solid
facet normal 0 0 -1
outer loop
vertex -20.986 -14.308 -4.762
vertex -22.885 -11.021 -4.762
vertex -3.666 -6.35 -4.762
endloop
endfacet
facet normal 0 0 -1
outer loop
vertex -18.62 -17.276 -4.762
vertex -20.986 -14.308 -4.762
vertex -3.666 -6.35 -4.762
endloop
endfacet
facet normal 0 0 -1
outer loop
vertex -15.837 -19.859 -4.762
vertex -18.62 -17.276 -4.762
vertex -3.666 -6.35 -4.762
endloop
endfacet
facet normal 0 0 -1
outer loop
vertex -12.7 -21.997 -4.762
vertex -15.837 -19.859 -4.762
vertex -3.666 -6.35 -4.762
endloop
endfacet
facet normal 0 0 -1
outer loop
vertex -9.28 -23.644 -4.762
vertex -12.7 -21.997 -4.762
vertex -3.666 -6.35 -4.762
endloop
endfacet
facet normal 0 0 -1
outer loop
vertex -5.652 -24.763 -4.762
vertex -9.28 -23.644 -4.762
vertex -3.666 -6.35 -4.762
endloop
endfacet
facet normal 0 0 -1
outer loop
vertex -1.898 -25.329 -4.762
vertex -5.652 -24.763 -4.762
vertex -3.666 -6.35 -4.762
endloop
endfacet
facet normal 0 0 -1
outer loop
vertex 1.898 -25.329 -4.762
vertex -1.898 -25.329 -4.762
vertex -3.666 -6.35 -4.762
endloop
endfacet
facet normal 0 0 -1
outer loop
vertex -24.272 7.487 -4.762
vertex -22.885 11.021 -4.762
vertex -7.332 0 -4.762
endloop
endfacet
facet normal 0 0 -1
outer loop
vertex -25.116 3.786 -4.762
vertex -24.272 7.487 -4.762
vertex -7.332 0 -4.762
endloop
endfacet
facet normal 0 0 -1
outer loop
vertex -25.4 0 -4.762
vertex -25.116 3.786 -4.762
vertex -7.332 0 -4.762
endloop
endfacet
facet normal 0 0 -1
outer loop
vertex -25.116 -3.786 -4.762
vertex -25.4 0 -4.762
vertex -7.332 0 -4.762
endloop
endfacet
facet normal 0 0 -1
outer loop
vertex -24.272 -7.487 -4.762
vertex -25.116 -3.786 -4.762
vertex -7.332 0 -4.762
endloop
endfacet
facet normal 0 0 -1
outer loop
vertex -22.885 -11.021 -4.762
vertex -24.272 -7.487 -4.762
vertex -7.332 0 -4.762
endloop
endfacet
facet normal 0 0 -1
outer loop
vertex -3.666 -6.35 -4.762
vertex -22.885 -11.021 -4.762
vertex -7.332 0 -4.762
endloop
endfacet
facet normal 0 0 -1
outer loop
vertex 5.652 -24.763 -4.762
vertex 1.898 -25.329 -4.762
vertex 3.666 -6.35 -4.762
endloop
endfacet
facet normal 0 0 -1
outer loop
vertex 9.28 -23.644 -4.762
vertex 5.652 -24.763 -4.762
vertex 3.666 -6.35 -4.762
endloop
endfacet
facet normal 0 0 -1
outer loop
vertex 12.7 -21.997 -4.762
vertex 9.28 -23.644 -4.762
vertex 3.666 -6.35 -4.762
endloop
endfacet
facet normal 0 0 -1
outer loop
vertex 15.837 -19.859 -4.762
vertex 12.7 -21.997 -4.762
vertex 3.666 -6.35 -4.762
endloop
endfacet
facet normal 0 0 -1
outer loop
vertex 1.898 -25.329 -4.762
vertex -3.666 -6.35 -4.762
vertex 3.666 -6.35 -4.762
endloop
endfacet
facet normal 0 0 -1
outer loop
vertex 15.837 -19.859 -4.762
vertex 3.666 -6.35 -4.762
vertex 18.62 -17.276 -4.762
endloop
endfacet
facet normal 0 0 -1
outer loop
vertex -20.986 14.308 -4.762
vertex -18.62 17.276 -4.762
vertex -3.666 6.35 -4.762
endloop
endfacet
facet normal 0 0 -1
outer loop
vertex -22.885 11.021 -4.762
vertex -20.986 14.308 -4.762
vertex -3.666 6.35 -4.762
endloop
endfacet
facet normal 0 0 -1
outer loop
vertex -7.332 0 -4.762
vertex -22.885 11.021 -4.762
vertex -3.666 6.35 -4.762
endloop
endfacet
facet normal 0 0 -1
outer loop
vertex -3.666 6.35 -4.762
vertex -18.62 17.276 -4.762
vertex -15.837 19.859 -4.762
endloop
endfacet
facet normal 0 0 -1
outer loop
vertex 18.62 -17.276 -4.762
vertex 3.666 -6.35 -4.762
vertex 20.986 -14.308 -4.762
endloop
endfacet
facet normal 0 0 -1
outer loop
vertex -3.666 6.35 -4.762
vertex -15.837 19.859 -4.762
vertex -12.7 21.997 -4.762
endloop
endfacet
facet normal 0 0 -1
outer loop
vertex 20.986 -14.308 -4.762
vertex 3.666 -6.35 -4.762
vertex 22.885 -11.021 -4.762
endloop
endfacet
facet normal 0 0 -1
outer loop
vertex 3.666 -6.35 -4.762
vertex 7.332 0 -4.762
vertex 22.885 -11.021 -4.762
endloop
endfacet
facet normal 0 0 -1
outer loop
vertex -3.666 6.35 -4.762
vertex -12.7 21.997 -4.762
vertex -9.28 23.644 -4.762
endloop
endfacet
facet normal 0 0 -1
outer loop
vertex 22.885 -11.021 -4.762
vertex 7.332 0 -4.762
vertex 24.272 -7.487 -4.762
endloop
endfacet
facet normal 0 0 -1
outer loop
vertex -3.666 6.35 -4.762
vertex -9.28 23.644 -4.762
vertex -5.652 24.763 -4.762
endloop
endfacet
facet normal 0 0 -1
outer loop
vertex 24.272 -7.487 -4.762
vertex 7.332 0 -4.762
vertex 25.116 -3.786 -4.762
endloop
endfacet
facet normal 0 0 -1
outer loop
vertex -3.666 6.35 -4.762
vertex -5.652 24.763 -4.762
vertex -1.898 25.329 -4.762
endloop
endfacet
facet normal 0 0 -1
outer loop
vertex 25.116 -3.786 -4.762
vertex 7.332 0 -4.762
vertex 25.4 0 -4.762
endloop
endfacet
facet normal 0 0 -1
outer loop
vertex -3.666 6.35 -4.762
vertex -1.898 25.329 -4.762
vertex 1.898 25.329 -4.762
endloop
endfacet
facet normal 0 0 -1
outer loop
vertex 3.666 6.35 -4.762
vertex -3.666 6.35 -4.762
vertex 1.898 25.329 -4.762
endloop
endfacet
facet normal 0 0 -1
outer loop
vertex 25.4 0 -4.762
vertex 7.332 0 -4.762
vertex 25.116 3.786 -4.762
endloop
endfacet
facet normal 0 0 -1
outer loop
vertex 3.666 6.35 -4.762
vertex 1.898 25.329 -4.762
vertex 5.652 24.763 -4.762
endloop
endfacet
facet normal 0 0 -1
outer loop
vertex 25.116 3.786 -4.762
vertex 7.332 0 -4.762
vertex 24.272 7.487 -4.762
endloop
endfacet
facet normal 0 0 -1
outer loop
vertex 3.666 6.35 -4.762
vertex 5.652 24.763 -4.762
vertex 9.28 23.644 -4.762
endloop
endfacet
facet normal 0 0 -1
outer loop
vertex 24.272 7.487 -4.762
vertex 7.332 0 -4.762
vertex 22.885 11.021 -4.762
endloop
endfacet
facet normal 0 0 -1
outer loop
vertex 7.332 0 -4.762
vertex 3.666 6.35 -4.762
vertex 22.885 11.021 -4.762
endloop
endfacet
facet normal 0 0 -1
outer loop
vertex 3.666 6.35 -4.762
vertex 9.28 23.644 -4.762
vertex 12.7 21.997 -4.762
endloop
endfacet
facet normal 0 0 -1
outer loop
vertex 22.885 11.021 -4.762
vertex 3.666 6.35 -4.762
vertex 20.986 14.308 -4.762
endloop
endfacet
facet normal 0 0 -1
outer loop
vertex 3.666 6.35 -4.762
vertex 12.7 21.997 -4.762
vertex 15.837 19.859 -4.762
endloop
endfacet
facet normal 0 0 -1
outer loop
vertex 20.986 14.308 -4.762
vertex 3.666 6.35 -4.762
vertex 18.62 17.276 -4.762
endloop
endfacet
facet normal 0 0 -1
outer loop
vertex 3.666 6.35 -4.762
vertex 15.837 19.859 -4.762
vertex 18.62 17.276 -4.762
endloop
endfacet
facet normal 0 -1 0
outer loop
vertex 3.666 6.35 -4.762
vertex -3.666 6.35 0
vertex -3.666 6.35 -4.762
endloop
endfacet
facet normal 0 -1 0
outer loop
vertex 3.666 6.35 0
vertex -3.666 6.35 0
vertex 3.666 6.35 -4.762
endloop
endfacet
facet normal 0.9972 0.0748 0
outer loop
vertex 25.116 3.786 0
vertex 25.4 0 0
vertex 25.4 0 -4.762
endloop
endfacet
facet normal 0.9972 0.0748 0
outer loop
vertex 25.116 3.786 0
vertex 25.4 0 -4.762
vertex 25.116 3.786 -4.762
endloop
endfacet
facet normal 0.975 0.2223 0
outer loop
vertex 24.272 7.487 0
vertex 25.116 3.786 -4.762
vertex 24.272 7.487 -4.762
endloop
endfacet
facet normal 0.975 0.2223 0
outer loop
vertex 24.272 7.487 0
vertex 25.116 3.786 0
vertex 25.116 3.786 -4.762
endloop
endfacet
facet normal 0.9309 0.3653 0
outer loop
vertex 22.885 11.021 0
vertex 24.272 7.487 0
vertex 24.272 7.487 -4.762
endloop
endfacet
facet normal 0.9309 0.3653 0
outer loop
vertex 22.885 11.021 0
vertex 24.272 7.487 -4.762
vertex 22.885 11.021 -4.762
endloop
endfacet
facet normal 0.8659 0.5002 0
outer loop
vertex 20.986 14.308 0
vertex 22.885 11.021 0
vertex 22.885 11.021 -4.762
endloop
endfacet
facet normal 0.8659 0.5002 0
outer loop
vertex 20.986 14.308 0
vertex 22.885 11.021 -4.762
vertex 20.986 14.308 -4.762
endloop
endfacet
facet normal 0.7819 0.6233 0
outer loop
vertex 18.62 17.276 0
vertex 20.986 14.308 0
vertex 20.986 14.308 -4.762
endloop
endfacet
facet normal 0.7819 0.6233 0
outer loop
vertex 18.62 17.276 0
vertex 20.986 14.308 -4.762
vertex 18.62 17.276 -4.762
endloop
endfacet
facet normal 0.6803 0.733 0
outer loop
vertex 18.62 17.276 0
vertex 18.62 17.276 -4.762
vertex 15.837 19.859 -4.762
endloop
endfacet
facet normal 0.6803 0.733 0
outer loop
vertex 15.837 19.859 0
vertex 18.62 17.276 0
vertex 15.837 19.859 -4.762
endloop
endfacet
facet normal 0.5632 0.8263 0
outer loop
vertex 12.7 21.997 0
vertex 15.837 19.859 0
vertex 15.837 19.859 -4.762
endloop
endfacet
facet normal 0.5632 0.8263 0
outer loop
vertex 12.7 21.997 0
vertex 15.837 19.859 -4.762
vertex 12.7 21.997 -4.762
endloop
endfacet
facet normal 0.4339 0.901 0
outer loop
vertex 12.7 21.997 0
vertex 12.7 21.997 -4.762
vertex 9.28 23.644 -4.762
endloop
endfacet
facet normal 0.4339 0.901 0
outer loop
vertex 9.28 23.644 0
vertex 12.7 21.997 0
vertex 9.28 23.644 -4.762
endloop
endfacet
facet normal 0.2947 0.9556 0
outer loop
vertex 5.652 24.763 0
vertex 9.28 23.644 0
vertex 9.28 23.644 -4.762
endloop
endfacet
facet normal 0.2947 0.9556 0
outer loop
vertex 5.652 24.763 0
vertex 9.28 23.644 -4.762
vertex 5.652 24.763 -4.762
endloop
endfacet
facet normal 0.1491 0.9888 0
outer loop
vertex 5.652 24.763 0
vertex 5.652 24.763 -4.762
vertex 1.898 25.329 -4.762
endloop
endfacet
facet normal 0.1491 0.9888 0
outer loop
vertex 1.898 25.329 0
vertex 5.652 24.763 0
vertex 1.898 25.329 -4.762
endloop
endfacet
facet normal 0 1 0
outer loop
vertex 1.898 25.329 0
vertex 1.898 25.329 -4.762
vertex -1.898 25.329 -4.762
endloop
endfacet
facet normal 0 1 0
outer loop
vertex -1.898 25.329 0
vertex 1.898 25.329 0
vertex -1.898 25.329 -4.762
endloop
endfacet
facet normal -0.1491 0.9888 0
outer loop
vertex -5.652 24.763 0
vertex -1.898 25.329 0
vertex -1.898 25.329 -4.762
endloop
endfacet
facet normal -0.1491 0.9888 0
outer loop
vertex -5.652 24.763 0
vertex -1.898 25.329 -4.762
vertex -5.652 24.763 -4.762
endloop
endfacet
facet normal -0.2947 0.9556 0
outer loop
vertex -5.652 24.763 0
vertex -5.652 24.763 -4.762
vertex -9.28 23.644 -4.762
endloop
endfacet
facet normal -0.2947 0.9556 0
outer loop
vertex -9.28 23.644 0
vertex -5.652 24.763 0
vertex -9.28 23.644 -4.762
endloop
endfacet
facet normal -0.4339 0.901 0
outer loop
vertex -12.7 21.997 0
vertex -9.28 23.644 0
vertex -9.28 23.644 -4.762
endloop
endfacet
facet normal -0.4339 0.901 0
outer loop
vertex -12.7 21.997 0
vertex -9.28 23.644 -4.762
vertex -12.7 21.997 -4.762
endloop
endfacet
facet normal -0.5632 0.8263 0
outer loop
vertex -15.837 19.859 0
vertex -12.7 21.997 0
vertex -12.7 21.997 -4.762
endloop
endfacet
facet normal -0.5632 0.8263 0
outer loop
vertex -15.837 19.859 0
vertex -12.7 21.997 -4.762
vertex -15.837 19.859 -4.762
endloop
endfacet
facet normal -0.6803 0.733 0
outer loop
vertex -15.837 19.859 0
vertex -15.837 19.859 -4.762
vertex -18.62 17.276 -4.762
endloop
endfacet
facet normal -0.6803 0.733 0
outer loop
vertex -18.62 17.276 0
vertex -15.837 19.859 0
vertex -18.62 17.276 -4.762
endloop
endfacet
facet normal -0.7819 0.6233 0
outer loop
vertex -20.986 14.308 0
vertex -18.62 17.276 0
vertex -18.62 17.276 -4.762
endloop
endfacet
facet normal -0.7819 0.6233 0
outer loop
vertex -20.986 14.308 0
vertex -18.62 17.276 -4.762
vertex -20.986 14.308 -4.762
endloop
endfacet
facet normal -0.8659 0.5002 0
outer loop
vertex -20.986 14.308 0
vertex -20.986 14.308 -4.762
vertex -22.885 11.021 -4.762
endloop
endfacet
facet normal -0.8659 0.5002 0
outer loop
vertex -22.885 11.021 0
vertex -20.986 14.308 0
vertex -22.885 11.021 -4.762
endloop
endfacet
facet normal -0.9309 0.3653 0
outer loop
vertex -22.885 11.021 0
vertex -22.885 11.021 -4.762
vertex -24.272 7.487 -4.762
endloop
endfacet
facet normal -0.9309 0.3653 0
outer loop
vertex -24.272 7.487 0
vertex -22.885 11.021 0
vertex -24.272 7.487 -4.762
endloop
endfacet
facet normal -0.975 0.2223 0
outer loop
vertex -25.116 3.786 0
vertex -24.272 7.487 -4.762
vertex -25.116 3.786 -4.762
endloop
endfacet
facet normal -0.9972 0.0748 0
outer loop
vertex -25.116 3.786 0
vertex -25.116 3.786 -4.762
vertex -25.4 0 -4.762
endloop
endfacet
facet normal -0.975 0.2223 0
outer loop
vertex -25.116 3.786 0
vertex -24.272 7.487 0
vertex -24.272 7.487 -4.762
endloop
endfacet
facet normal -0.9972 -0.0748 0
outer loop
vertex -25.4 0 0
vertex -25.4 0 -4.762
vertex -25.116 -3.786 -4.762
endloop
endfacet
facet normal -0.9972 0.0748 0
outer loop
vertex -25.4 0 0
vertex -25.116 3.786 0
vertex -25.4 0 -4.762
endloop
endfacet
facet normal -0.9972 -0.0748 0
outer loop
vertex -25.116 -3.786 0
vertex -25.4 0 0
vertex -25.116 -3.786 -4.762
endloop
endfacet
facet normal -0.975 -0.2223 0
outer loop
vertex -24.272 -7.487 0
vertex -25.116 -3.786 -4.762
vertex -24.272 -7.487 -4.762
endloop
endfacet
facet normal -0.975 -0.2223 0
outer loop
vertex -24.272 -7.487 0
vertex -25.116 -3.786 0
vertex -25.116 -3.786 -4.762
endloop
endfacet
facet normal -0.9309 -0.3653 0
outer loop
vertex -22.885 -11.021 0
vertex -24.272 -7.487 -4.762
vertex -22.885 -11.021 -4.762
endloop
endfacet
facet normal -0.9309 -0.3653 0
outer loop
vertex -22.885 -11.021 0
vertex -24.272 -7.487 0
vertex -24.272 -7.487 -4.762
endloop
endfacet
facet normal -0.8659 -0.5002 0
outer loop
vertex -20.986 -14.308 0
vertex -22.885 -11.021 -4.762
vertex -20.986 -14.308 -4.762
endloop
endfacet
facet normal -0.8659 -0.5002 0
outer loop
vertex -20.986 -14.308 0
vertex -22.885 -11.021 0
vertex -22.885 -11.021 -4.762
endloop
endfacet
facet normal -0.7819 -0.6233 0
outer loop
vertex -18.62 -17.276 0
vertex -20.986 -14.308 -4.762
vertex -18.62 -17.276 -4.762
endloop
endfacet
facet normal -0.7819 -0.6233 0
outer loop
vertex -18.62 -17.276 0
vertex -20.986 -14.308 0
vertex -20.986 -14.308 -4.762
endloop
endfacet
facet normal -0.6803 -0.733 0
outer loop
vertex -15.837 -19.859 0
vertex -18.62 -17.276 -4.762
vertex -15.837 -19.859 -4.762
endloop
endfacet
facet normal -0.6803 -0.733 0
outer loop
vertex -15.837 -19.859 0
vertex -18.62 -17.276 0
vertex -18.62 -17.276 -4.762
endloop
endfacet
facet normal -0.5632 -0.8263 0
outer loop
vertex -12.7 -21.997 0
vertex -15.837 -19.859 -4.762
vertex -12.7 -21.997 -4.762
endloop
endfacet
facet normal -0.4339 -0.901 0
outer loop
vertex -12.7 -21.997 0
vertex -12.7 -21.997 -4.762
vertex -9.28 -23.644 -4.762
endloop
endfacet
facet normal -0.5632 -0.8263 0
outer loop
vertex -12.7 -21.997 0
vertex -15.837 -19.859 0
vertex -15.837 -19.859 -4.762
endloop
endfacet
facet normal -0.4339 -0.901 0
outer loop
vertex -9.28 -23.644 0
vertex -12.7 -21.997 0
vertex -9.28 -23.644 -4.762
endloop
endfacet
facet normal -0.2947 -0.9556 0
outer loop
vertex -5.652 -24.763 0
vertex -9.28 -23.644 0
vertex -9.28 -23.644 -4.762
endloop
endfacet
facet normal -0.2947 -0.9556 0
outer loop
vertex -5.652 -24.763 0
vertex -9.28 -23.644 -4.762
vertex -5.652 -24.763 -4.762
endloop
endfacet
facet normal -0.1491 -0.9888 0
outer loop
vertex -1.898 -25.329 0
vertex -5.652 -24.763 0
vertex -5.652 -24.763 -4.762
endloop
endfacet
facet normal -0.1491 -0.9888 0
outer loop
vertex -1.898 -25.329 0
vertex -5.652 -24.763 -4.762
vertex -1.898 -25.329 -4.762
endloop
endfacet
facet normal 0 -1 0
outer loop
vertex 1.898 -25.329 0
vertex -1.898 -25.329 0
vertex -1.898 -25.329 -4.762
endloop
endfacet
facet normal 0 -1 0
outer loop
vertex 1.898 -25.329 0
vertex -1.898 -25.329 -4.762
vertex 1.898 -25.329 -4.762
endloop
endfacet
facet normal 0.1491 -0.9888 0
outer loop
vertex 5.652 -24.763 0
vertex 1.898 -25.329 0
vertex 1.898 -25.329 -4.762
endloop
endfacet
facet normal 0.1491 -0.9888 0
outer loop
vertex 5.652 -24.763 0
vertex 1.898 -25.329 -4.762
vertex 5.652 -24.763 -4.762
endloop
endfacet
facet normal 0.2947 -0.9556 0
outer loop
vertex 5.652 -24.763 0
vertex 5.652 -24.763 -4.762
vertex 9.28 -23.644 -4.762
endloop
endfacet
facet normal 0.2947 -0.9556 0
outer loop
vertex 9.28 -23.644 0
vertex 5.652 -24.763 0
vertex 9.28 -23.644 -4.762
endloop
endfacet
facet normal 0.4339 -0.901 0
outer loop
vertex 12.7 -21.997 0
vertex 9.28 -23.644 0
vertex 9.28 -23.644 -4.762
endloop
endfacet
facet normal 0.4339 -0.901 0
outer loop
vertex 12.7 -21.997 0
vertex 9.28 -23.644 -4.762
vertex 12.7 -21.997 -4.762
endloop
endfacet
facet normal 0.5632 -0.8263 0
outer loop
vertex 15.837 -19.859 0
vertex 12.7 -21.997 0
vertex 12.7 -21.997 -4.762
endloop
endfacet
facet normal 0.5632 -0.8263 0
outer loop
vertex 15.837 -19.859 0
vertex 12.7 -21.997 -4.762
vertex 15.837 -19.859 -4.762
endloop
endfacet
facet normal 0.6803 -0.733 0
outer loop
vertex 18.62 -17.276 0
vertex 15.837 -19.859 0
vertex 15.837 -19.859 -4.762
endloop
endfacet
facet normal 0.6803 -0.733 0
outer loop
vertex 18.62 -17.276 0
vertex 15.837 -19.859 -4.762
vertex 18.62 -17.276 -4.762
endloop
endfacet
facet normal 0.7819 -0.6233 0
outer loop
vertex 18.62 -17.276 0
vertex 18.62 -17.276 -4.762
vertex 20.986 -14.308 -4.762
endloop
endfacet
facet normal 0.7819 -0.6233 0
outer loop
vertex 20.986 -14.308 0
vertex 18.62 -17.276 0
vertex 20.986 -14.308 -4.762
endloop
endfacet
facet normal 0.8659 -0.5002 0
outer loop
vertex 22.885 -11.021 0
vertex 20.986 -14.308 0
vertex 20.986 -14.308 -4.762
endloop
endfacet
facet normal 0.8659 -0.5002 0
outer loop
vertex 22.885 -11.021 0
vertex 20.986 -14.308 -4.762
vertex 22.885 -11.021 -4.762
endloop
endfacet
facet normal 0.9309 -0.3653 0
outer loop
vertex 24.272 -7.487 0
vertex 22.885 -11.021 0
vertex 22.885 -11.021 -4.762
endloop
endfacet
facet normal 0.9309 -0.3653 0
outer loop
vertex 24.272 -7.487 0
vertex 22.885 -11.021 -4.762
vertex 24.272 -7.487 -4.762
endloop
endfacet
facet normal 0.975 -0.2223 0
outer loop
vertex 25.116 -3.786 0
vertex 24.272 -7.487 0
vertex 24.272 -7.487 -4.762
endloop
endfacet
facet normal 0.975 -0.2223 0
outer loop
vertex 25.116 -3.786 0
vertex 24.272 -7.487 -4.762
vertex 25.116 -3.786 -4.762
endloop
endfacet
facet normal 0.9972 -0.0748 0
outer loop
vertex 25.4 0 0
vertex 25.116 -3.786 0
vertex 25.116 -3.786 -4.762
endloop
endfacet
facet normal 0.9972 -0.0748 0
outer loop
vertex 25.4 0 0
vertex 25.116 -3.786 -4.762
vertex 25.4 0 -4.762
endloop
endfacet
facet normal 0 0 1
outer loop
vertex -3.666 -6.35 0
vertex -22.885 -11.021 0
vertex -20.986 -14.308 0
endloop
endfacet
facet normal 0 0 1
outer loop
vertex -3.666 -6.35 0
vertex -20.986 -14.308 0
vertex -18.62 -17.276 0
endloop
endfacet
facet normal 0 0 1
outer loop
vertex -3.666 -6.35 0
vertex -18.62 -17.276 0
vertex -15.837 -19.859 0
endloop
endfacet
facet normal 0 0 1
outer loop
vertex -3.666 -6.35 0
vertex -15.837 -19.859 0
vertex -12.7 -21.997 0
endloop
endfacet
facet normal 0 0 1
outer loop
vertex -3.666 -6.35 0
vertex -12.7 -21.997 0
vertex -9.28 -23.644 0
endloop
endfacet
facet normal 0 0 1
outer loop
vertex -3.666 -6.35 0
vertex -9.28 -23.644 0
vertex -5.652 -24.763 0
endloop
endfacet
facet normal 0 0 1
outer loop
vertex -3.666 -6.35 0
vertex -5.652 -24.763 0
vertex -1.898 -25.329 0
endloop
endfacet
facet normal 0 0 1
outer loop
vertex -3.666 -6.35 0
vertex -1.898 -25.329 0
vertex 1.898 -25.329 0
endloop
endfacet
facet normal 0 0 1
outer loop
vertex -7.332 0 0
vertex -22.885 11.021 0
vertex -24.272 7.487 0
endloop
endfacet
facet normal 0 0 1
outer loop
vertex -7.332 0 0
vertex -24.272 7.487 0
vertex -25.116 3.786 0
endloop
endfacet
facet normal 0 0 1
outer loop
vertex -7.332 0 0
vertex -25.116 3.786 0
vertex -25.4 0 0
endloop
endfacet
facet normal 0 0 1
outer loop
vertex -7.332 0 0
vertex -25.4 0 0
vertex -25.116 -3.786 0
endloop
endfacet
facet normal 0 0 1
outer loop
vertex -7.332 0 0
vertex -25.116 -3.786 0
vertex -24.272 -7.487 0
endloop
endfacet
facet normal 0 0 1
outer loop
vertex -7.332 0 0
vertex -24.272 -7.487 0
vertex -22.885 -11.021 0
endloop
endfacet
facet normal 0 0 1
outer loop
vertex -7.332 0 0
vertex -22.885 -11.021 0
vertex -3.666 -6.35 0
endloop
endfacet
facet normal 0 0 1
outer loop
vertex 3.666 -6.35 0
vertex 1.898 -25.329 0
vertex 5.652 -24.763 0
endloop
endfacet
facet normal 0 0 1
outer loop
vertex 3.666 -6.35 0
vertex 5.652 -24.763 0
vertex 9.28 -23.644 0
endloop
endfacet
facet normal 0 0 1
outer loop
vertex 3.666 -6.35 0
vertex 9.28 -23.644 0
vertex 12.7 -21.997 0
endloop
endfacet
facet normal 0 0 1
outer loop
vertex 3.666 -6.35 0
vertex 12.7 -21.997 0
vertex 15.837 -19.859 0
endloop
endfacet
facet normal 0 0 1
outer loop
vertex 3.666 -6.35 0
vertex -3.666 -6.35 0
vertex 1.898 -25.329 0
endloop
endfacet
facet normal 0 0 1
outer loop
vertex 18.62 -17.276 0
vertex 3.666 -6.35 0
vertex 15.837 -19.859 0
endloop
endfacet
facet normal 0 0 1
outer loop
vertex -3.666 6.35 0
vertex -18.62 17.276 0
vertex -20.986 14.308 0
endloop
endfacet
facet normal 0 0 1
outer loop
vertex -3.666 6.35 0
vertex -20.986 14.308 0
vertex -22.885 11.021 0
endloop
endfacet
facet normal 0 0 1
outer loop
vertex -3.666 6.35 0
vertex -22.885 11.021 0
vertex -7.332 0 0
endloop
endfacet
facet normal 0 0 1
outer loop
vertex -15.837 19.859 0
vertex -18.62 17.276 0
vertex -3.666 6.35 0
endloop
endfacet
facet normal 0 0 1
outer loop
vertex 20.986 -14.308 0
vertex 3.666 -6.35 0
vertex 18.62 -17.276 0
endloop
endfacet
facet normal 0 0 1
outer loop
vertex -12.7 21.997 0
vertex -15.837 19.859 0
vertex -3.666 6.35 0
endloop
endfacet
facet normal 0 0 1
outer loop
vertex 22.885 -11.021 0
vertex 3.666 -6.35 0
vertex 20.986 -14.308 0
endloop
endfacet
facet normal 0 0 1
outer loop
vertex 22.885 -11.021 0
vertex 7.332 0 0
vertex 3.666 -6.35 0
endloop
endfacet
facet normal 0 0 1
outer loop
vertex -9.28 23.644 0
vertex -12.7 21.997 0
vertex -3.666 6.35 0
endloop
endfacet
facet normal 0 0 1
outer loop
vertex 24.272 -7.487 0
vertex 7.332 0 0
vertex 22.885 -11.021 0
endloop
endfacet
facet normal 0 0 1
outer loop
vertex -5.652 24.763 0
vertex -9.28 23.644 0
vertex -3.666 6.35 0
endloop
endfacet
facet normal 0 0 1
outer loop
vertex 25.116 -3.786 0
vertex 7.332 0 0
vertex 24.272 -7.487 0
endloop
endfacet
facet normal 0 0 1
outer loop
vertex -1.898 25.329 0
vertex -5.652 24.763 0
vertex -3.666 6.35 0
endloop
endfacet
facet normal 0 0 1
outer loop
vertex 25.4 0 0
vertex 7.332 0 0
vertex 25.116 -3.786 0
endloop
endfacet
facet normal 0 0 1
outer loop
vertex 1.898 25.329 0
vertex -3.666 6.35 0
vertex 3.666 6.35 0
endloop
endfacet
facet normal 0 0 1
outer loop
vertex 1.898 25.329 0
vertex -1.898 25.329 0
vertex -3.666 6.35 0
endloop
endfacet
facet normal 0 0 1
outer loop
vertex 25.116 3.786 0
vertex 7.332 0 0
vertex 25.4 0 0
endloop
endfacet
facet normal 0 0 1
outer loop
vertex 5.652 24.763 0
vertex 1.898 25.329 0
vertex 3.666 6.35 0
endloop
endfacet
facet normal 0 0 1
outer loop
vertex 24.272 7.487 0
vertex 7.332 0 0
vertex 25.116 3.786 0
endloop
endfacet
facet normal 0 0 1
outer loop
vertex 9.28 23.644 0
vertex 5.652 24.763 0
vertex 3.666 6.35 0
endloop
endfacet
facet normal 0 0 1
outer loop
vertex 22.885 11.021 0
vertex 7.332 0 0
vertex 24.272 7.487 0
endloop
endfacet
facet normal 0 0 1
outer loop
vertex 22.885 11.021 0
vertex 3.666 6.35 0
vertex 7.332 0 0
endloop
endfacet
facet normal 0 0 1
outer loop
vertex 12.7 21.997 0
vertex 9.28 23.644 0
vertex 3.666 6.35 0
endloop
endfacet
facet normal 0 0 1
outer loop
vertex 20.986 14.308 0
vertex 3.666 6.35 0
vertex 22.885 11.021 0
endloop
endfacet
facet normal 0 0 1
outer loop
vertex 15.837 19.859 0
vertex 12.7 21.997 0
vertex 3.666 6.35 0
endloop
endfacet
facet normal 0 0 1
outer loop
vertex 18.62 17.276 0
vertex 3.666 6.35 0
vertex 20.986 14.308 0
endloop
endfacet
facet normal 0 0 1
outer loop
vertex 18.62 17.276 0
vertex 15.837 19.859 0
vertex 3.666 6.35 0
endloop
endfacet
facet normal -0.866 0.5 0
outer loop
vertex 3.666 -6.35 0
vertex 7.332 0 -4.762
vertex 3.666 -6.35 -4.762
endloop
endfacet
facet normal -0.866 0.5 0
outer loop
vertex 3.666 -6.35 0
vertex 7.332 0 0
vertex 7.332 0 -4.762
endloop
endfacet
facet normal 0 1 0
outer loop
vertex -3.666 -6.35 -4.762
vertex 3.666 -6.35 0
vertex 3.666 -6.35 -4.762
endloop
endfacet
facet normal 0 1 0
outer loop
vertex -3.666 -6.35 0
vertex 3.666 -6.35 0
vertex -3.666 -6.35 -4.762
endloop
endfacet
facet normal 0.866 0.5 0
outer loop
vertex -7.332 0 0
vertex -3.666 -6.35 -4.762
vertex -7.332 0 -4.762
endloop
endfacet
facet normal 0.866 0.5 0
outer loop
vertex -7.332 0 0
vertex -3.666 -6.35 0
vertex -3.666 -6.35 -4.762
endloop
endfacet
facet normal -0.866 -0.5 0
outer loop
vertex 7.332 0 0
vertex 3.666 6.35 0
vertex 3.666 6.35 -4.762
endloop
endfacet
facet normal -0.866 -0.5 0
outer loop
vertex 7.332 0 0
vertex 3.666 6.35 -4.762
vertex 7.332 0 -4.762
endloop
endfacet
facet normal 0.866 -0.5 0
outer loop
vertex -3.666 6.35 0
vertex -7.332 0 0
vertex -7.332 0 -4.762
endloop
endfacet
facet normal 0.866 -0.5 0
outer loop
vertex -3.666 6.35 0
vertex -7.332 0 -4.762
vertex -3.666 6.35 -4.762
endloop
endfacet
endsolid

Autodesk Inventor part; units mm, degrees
ref_plane "YZ Plane" through (0, 0, 0) normal (1, 0, 0) x (0, 1, 0)
ref_plane "XZ Plane" through (0, 0, 0) normal (0, 1, 0) x (-1, 0, 0)
ref_plane "XY Plane" through (0, 0, 0) normal (0, 0, 1) x (1, 0, 0)
sketch "Sketch1" plane through (0, 0, 0) normal (0, 0, 1) x (1, 0, 0)
  line L0 (3.6662, 6.35) -> (7.3323, 0)
  line L1 (7.3323, 0) -> (3.6662, -6.35)
  line L2 (3.6662, -6.35) -> (-3.6662, -6.35)
  line L3 (-3.6662, -6.35) -> (-7.3323, 0)
  line L4 (-7.3323, 0) -> (-3.6662, 6.35)
  line L5 (-3.6662, 6.35) -> (3.6662, 6.35)
  circle A0 centre (0, 0) radius 25.4
  circle A1 centre (0, 0) radius 7.3323 construction
  dimension "d0" = 12.7
  dimension "d2" = 50.8
  dimension "d3" = 18.0677
extrude "Extrusion1" add sketch "Sketch1" against normal blind 4.7625
properties part number "1_2x2x1_4-hexBearing" material "PC/ABS Plastic"
